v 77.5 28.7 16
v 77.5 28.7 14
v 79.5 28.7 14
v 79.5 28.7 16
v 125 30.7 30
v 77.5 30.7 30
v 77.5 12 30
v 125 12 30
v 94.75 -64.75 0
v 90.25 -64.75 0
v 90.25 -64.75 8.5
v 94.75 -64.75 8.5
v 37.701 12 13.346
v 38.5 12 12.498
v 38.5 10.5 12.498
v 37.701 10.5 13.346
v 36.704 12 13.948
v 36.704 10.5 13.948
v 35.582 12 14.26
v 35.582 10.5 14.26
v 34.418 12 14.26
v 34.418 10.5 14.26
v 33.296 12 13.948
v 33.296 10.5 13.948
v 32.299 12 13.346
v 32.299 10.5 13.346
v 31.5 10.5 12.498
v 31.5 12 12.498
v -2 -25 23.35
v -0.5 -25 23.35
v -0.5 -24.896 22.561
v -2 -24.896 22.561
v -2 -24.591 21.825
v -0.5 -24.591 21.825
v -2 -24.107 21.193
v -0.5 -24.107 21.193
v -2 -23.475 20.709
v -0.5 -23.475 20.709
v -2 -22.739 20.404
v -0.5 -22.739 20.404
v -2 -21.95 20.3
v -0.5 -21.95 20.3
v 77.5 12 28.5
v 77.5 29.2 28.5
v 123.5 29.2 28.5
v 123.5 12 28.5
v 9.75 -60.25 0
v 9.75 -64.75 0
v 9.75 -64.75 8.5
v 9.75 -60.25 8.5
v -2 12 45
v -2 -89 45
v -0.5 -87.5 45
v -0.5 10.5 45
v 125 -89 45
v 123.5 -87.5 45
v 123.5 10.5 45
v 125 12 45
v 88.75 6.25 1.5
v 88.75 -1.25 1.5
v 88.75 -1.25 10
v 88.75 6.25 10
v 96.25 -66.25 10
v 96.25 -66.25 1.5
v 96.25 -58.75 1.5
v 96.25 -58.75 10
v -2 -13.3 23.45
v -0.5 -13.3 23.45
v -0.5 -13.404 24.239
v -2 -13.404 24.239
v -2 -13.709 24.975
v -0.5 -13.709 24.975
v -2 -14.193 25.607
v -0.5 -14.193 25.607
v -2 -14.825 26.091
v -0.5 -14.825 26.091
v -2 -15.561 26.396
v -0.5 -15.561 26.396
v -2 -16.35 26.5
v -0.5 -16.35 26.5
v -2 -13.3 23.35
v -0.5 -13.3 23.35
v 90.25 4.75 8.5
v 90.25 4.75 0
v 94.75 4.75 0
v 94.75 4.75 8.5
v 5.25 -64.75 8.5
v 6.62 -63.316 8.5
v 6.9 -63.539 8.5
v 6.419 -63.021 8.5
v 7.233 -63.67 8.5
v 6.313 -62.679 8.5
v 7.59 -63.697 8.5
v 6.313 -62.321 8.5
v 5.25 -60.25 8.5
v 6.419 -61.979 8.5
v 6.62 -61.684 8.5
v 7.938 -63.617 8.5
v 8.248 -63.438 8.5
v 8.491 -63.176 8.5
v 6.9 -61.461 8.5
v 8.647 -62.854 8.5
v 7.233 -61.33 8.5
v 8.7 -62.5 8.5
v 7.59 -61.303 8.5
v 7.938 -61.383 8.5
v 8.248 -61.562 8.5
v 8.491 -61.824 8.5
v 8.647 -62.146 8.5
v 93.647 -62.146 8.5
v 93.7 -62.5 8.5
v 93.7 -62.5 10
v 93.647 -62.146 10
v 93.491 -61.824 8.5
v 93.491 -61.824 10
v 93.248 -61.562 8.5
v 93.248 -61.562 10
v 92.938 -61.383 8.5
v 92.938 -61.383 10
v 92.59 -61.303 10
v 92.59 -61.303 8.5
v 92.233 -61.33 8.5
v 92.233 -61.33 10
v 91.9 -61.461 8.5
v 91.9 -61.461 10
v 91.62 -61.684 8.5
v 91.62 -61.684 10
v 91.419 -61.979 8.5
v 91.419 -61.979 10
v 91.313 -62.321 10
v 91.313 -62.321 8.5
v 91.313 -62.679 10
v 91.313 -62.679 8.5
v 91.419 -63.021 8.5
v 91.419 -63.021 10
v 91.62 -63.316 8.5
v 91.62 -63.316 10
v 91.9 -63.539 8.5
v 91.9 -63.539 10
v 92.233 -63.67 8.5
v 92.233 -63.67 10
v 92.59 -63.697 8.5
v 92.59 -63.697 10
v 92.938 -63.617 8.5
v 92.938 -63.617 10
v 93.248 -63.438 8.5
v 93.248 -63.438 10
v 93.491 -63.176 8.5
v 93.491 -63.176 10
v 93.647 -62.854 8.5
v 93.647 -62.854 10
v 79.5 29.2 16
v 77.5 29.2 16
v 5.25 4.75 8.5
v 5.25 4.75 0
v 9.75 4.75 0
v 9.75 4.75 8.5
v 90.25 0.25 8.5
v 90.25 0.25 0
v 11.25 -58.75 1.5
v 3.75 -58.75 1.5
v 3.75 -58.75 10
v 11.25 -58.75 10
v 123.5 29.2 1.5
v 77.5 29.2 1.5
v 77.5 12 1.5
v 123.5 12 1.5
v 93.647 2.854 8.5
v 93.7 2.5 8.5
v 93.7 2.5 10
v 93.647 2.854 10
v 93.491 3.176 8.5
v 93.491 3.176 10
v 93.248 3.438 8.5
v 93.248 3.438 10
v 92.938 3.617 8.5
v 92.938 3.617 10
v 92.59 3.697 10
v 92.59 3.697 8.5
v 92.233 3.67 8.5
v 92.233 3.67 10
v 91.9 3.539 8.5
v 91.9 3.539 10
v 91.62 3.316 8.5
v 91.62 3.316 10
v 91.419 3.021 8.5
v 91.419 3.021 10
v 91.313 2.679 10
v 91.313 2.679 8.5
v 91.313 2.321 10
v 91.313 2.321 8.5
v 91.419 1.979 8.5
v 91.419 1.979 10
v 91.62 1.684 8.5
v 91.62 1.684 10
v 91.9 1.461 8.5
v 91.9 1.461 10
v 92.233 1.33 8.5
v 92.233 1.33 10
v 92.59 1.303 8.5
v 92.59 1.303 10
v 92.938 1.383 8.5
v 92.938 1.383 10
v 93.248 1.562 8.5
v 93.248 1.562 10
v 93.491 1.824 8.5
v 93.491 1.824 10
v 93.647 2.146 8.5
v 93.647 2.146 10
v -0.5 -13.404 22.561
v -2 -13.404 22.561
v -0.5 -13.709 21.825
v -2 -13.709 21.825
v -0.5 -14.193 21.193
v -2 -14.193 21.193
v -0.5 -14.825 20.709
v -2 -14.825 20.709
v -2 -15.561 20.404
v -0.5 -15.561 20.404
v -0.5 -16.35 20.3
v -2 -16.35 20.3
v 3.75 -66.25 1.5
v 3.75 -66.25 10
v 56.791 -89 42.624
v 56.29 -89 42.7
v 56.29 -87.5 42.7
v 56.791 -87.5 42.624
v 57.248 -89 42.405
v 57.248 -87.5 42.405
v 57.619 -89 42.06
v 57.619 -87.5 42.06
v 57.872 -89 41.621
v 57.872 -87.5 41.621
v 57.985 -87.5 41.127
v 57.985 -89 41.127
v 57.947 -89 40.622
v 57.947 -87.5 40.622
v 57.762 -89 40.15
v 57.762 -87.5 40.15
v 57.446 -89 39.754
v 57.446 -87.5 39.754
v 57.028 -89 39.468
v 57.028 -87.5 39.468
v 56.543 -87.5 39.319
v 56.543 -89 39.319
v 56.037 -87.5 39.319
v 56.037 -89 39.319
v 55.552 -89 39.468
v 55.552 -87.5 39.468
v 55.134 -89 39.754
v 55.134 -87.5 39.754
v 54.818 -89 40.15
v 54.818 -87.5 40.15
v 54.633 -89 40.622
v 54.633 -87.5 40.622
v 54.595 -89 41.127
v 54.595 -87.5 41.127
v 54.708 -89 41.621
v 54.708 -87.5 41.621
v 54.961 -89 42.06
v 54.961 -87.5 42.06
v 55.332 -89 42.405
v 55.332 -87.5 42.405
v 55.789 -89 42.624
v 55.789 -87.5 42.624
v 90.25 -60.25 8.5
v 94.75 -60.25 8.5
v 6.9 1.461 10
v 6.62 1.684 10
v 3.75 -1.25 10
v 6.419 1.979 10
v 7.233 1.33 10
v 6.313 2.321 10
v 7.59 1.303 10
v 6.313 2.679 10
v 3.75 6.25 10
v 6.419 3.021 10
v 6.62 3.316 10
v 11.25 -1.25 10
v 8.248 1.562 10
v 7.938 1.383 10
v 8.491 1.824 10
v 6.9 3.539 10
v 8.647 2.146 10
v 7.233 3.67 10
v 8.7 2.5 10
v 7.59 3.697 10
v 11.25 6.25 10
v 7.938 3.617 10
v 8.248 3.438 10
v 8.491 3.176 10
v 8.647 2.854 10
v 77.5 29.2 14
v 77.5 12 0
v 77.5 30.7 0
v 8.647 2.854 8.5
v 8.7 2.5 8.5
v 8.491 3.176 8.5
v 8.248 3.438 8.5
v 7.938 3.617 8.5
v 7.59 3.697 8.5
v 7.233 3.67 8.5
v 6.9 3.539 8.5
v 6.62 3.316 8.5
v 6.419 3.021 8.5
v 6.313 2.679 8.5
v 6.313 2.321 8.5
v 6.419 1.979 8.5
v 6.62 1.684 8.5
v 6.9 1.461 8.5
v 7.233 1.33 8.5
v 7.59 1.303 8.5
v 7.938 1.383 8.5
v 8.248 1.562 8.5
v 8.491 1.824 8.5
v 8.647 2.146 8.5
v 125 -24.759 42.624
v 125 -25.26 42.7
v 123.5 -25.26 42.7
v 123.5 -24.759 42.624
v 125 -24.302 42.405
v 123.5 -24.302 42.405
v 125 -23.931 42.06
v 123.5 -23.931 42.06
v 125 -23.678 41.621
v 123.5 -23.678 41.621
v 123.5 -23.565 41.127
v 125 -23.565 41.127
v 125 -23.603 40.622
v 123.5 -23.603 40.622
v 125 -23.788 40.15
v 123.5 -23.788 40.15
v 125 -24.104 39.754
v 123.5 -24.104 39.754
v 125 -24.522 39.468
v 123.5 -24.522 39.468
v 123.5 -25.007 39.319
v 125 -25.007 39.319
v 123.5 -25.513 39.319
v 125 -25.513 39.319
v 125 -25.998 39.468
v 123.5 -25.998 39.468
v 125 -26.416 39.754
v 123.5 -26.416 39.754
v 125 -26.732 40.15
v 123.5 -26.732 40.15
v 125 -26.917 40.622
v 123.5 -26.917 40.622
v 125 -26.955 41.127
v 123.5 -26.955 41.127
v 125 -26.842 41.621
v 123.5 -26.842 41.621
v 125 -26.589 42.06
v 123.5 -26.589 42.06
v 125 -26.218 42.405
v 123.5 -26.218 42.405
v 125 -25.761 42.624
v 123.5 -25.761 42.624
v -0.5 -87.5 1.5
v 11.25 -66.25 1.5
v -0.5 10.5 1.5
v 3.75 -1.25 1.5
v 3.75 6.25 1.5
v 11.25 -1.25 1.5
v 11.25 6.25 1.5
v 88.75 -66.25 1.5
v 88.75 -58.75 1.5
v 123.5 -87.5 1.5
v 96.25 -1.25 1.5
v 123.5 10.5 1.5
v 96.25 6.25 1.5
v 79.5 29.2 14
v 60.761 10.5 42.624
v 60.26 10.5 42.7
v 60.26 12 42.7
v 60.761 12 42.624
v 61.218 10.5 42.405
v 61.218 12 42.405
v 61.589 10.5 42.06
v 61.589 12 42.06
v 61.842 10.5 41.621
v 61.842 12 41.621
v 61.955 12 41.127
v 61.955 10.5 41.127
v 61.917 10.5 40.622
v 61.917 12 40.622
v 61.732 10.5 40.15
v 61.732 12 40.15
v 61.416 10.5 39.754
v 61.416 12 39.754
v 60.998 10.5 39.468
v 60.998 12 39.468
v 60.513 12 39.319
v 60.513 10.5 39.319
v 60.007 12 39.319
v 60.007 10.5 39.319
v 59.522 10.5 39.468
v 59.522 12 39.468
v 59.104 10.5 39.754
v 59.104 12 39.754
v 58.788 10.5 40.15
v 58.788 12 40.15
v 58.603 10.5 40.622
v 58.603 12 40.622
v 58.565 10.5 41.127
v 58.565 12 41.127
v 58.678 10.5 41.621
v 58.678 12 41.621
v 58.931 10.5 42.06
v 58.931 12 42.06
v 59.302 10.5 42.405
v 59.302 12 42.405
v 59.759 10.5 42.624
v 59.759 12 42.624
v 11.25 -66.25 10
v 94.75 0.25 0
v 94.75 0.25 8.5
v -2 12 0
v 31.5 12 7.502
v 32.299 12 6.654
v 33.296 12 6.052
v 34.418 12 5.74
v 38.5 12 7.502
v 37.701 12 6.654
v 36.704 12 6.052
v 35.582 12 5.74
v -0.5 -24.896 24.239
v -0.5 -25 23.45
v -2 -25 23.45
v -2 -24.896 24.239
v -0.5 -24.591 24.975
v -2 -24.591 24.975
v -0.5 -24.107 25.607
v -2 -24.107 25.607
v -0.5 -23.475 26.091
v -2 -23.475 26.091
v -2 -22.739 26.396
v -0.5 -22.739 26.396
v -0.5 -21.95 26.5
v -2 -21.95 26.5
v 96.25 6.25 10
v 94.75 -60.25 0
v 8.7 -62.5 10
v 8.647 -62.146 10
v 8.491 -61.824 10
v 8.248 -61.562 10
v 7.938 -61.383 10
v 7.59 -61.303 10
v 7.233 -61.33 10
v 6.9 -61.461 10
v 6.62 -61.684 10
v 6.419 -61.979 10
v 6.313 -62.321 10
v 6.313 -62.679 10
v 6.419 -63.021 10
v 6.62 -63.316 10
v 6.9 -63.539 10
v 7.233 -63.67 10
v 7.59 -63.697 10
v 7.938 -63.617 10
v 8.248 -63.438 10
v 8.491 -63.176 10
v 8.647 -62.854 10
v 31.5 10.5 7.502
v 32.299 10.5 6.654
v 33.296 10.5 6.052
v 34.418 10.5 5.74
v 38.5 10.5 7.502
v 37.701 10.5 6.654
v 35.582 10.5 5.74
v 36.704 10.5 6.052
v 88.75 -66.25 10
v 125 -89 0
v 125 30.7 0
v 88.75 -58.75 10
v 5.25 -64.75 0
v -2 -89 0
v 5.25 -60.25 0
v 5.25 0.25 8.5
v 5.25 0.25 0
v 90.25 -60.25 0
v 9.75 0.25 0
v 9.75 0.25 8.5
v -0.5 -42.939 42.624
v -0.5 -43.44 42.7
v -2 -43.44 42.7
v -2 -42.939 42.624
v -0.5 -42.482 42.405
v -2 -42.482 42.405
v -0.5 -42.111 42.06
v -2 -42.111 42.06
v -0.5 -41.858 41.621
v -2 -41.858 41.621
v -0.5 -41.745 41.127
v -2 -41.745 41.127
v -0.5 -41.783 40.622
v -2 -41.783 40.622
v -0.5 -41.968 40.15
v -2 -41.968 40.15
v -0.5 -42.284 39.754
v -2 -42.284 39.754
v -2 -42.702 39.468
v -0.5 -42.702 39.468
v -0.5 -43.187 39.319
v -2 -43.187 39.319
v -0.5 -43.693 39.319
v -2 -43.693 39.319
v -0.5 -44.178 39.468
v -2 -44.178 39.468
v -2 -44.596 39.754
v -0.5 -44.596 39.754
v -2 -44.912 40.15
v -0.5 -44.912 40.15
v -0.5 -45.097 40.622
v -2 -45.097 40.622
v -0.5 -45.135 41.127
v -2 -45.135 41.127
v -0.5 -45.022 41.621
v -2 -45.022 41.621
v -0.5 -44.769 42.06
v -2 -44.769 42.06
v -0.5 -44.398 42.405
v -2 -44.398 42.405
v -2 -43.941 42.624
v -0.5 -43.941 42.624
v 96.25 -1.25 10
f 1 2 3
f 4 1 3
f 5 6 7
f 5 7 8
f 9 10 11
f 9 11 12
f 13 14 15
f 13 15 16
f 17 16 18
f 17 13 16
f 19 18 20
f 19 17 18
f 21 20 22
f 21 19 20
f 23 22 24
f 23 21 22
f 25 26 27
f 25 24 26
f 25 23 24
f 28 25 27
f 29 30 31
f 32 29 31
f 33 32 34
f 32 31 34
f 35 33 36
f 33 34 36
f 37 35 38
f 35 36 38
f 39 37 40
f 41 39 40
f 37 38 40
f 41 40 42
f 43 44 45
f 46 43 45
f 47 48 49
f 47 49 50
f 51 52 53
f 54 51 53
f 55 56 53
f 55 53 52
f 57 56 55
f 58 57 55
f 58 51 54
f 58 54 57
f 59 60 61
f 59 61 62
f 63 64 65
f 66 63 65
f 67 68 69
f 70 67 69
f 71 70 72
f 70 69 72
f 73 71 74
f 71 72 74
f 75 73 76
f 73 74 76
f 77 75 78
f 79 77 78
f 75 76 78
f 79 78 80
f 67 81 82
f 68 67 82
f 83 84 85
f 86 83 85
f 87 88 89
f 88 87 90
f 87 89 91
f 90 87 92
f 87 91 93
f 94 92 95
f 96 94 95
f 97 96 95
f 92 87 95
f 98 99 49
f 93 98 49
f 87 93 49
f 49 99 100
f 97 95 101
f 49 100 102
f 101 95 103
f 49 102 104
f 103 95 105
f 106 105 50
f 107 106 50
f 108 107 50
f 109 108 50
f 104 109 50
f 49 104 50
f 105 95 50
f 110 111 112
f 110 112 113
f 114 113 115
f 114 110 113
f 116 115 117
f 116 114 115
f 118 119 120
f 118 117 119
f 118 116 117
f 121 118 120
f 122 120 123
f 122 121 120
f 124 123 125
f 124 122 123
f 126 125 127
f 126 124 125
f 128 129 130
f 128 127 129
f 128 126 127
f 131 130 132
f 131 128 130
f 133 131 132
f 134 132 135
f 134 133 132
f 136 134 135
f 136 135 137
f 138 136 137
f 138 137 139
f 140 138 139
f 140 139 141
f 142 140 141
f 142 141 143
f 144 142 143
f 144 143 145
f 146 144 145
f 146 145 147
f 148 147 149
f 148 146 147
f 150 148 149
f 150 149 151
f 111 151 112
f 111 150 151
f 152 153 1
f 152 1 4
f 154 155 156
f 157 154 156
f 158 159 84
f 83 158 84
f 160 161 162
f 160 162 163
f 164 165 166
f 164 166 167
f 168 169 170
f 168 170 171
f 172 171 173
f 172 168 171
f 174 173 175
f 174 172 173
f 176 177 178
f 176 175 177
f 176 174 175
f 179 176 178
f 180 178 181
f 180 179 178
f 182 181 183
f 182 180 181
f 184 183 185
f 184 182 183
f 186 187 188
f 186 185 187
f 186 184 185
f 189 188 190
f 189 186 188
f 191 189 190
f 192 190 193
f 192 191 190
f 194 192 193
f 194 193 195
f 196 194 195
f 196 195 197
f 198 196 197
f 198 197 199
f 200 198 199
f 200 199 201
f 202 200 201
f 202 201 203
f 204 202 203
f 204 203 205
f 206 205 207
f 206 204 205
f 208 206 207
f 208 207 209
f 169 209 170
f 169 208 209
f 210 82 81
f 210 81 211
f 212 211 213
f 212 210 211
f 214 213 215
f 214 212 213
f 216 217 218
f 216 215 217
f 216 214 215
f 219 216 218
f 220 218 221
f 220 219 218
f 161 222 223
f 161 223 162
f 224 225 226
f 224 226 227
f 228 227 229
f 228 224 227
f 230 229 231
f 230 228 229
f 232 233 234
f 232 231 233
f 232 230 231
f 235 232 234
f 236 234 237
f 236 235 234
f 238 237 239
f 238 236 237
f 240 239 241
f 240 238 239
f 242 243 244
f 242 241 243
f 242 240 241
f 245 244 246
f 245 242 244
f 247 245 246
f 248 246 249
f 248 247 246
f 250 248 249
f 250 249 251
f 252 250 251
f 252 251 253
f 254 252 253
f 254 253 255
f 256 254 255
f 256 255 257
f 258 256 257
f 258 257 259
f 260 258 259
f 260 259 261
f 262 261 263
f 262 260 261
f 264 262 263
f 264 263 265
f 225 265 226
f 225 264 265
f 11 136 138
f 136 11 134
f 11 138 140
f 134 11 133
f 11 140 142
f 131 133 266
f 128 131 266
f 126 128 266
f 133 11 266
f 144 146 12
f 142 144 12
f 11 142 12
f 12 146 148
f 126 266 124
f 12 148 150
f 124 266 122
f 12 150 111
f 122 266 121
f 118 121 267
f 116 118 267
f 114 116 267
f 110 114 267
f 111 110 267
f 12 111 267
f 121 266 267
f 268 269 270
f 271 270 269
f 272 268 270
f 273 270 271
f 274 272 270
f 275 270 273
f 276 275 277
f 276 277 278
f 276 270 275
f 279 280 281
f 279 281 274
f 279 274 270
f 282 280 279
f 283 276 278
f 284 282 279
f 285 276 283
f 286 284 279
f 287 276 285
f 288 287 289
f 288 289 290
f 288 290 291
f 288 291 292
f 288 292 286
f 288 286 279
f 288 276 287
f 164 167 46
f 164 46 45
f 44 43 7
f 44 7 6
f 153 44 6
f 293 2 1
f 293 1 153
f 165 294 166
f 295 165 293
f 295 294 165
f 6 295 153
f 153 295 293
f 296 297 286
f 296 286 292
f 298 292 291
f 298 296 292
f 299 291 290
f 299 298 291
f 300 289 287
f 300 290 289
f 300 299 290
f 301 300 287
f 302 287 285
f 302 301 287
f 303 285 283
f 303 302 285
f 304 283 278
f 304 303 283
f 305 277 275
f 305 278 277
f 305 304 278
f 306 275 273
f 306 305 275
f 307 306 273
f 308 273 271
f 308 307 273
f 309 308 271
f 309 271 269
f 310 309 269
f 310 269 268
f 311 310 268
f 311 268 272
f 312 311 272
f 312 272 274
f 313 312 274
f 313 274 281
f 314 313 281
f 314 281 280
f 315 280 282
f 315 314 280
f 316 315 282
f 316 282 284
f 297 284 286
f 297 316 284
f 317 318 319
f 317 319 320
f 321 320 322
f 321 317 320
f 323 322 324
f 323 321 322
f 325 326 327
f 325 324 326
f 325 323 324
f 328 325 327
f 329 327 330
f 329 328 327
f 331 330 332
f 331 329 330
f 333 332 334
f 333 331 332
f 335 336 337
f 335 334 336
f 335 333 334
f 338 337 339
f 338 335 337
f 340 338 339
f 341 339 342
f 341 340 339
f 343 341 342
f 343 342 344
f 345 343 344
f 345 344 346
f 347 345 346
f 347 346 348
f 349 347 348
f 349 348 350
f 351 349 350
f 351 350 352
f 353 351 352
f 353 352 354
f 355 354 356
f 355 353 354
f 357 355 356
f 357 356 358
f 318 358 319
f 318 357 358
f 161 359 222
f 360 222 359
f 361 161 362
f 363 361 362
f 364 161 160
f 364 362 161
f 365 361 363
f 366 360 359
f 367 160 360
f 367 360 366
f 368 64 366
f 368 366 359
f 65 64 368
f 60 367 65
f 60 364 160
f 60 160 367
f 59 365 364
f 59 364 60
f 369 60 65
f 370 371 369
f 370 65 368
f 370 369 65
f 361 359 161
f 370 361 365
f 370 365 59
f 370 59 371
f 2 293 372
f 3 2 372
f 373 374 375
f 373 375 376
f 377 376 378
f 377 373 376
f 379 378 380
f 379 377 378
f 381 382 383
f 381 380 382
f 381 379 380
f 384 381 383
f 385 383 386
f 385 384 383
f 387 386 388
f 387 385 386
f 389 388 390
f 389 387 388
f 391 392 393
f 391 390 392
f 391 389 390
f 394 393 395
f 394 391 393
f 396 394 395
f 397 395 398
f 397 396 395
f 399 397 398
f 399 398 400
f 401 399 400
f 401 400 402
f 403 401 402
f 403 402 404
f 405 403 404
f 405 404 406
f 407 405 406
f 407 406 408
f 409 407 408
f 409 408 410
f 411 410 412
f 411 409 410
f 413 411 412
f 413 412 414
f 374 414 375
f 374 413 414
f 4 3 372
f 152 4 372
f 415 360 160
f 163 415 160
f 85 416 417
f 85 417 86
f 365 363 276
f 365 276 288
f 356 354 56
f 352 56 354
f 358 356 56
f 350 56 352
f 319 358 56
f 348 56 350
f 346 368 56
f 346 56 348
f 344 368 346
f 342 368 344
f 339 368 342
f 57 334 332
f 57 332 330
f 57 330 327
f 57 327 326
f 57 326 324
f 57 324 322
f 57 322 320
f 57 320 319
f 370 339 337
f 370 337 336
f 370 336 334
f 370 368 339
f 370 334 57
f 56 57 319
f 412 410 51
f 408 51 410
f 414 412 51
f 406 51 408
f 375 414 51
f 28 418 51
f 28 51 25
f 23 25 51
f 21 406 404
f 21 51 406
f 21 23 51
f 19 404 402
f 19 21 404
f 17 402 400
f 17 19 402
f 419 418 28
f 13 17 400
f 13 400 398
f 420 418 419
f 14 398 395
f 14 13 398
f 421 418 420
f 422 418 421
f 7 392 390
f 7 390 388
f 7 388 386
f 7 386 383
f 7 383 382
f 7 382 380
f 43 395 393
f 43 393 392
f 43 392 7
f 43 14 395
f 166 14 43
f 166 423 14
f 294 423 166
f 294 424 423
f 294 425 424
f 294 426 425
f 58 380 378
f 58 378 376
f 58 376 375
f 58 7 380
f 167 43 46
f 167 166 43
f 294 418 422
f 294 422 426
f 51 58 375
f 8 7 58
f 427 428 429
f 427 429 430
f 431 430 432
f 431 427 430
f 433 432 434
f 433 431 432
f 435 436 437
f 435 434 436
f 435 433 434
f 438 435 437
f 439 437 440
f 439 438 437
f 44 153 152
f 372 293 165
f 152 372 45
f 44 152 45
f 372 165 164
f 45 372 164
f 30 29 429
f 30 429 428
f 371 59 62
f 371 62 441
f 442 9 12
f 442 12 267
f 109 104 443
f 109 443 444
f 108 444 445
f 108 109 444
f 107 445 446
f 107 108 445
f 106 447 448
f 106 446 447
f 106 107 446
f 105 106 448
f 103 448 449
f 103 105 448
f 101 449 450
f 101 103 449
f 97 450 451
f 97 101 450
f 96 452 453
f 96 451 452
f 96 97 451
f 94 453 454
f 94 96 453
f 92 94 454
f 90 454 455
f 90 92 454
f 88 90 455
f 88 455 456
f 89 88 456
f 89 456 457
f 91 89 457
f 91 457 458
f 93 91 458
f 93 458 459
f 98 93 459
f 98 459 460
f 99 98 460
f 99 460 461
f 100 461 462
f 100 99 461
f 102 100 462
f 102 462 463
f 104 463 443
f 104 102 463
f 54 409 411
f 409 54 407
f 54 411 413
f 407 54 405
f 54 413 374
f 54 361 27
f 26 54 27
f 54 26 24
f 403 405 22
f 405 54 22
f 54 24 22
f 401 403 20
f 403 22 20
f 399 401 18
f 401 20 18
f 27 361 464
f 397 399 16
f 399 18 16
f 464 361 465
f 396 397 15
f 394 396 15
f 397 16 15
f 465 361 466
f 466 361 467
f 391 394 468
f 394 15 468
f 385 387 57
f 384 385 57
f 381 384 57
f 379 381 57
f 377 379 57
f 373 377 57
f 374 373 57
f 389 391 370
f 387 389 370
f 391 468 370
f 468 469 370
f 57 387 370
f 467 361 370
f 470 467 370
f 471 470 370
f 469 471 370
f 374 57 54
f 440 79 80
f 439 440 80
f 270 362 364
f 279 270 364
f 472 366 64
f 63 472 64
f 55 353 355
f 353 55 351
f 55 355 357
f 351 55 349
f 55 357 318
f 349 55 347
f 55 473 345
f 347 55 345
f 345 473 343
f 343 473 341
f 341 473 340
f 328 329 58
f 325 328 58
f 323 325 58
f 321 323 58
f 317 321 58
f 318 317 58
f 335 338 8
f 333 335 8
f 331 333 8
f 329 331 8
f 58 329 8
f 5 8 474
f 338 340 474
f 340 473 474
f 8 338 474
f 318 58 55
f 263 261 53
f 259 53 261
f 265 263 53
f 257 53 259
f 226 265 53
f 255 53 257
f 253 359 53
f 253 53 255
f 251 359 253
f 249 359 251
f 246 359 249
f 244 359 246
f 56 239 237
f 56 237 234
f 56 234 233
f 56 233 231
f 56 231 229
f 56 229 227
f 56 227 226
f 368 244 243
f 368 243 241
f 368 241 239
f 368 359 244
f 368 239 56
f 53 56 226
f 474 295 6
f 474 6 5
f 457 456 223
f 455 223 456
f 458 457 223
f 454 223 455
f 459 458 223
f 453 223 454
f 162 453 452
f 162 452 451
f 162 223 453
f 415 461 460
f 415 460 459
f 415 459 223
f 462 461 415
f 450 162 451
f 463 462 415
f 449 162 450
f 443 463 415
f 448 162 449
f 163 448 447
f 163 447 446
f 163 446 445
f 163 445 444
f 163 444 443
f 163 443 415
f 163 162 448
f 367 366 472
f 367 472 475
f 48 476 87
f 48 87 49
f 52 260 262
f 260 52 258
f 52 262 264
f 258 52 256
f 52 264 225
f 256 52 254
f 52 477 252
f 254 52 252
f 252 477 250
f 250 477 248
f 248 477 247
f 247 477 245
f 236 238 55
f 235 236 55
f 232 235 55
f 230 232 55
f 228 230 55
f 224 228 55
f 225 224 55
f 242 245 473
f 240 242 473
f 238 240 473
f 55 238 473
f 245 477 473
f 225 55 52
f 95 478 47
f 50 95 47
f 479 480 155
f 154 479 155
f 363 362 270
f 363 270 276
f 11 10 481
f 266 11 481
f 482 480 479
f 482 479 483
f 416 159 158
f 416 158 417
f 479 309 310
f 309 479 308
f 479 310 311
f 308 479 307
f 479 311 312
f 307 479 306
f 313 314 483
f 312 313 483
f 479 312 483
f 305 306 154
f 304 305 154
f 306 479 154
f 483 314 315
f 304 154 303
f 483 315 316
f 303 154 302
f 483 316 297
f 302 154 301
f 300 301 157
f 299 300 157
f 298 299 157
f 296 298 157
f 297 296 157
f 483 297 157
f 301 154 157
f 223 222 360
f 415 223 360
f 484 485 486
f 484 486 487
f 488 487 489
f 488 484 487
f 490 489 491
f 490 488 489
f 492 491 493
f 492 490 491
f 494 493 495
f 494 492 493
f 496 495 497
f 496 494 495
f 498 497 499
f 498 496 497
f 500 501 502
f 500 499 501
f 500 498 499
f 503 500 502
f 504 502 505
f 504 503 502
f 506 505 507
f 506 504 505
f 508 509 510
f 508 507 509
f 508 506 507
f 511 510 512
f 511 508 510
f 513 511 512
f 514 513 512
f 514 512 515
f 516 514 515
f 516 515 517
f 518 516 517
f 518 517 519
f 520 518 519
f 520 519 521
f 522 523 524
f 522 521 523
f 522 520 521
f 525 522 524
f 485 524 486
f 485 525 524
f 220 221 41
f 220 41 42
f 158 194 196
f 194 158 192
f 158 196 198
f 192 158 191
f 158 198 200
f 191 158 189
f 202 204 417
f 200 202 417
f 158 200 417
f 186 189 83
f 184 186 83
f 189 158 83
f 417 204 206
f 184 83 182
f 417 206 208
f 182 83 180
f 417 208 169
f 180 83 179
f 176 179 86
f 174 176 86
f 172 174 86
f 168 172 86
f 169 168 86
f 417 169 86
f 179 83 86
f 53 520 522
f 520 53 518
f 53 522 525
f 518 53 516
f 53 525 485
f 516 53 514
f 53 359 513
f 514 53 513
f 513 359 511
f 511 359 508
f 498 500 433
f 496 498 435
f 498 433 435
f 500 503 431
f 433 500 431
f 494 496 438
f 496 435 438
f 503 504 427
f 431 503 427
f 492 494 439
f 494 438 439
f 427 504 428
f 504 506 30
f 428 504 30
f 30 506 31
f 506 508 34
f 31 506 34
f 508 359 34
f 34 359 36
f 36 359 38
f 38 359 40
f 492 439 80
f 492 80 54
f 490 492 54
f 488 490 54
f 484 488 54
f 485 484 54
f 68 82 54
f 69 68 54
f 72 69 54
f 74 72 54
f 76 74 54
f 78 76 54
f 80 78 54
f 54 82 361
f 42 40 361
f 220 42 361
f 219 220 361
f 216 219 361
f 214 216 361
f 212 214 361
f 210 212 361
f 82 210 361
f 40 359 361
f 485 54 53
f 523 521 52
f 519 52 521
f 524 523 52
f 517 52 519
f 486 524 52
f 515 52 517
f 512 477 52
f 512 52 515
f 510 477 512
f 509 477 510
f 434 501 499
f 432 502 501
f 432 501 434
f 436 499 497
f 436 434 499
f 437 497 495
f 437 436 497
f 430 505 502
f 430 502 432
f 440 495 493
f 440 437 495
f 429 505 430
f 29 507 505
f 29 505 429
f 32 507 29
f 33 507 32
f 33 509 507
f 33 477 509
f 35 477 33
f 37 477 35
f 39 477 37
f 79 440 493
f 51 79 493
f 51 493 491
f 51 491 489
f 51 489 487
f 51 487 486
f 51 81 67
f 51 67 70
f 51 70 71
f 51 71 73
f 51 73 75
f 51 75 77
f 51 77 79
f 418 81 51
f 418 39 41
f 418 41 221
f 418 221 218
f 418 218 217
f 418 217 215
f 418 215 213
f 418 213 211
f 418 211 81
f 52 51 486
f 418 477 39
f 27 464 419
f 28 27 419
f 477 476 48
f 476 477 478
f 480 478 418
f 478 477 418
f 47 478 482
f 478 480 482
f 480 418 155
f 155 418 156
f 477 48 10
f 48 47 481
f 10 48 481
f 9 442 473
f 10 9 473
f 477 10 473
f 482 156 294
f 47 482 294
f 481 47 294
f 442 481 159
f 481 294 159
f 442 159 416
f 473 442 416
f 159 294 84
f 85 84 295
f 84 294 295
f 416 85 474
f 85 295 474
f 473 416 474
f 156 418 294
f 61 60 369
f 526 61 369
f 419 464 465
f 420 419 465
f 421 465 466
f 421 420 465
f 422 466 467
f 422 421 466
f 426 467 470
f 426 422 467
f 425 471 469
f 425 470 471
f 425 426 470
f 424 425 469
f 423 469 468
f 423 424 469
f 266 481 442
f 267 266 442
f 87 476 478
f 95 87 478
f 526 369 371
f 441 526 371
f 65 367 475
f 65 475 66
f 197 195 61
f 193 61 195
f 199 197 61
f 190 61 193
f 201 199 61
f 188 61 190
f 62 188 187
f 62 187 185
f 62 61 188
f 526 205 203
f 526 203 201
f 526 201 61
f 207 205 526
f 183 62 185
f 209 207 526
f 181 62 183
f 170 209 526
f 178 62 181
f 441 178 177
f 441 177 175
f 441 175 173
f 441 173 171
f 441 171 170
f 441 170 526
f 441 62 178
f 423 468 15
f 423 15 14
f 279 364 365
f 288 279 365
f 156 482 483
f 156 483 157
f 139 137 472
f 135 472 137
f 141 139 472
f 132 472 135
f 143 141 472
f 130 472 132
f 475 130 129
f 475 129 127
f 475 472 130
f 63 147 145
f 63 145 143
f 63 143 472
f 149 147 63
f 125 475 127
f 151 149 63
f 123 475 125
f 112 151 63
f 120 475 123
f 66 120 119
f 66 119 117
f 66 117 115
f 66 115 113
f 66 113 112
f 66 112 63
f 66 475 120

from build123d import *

# Parameters (mm, degrees)
BOX054_W          = 2
BOX054_H          = 2
BOX054_DEPTH      = 2
BOX051_W          = 47.5
BOX051_H          = 17.2
BOX051_DEPTH      = 27
BOX050_W          = 47.5
BOX050_H          = 18.7
BOX050_DEPTH      = 30
BOX053_W          = 10
BOX053_H          = 11.7
BOX053_DEPTH      = 6.2
FILLET001_R       = 3.05
CYLINDER038_R     = 1.7
CYLINDER038_DEPTH = 10
CYLINDER037_R     = 1.7
CYLINDER037_DEPTH = 10
CYLINDER036_R     = 1.7
CYLINDER036_DEPTH = 10
CYLINDER035_R     = 1.7
CYLINDER035_DEPTH = 10
BOX024_W          = 10
BOX024_H          = 10
BOX024_DEPTH      = 10
BOX025_W          = 10
BOX025_H          = 10
BOX025_DEPTH      = 10
CYLINDER023_R     = 4.3
CYLINDER023_DEPTH = 5
CYLINDER019_R     = 1.2
CYLINDER019_DEPTH = 10
BOX013_W          = 4.5
BOX013_H          = 4.5
BOX013_DEPTH      = 10
BOX012_W          = 7.5
BOX012_H          = 7.5
BOX012_DEPTH      = 10
CYLINDER020_R     = 1.2
CYLINDER020_DEPTH = 10
BOX015_W          = 4.5
BOX015_H          = 4.5
BOX015_DEPTH      = 10
BOX014_W          = 7.5
BOX014_H          = 7.5
BOX014_DEPTH      = 10
CYLINDER021_R     = 1.2
CYLINDER021_DEPTH = 10
BOX017_W          = 4.5
BOX017_H          = 4.5
BOX017_DEPTH      = 10
BOX016_W          = 7.5
BOX016_H          = 7.5
BOX016_DEPTH      = 10
CYLINDER022_R     = 1.2
CYLINDER022_DEPTH = 10
BOX019_W          = 4.5
BOX019_H          = 4.5
BOX019_DEPTH      = 10
BOX018_W          = 7.5
BOX018_H          = 7.5
BOX018_DEPTH      = 10
BOX022_W          = 4.5
BOX022_H          = 4.5
BOX022_DEPTH      = 10
BOX021_W          = 4.5
BOX021_H          = 4.5
BOX021_DEPTH      = 10
BOX023_W          = 4.5
BOX023_H          = 4.5
BOX023_DEPTH      = 10
CYLINDER016_R     = 1.2
CYLINDER016_DEPTH = 100
BOX020_W          = 4.5
BOX020_H          = 4.5
BOX020_DEPTH      = 10
CYLINDER015_R     = 1.2
CYLINDER015_DEPTH = 100
BOX010_W          = 124
BOX010_H          = 98
BOX010_DEPTH      = 45
BOX009_W          = 127
BOX009_H          = 101
BOX009_DEPTH      = 45


with BuildPart() as cube054:
    # Box054 → Box054 (new body)
    with BuildSketch(Plane(origin=(77.5, 107.7, 14), x_dir=(1, 0, 0), z_dir=(0, 0, 1))):
        with Locations((1, 1)):
            Rectangle(BOX054_W, BOX054_H)
    extrude(amount=BOX054_DEPTH)


with BuildPart() as cube051:
    # Box051 → Box051 (new body)
    with BuildSketch(Plane(origin=(-1.5, 0, 60), x_dir=(1, 0, 0), z_dir=(0, 0, 1))):
        with Locations((23.75, 8.6)):
            Rectangle(BOX051_W, BOX051_H)
    extrude(amount=BOX051_DEPTH)


with BuildPart() as batteryholder:
    # Box050 → Box050 (new body)
    with BuildSketch(Plane.XY.offset(58.5)):
        with Locations((23.75, 9.35)):
            Rectangle(BOX050_W, BOX050_H)
    extrude(amount=BOX050_DEPTH)

    # Cut062: cut Cube051
    add(cube051.part, mode=Mode.SUBTRACT)


with BuildPart() as batteryholder_1:
    # Cut062 placement: moved
    add(batteryholder.part.moved(Location((77.5, 91, -58.5))))

    # Fusion004: union Cube054
    add(cube054.part)


with BuildPart() as fillet001:
    # Box053 → Box053 (new body)
    with BuildSketch(Plane(origin=(0, -50, 10.3), x_dir=(1, 0, 0), z_dir=(0, 0, 1))):
        with Locations((5, 5.85)):
            Rectangle(BOX053_W, BOX053_H)
    extrude(amount=BOX053_DEPTH)

    # Fillet001
    fillet001_edges = [fillet001.edges().sort_by_distance(p)[0] for p in [
        (5, -50, 10.3),
        (5, -50, 16.5),
        (5, -38.3, 10.3),
        (5, -38.3, 16.5),
    ]]
    fillet(fillet001_edges, radius=FILLET001_R)


with BuildPart() as fillet001_1:
    # Fillet001 placement: moved
    add(fillet001.part.moved(Location((-5, 104, 10))))


with BuildPart() as cylinder038:
    # Cylinder038 → Cylinder038 (new body)
    with BuildSketch(Plane(origin=(126.15, 53.74, 41), x_dir=(0, 0, 1), z_dir=(-1, 0, 0))):
        Circle(CYLINDER038_R)
    extrude(amount=CYLINDER038_DEPTH)


with BuildPart() as cylinder037:
    # Cylinder037 → Cylinder037 (new body)
    with BuildSketch(Plane(origin=(56.29, -11.48, 41), x_dir=(0, 0, 1), z_dir=(0, 1, 0))):
        Circle(CYLINDER037_R)
    extrude(amount=CYLINDER037_DEPTH)


with BuildPart() as cylinder036:
    # Cylinder036 → Cylinder036 (new body)
    with BuildSketch(Plane(origin=(60.26, 82.82, 41), x_dir=(0, 0, 1), z_dir=(0, 1, 0))):
        Circle(CYLINDER036_R)
    extrude(amount=CYLINDER036_DEPTH)


with BuildPart() as cylinder035:
    # Cylinder035 → Cylinder035 (new body)
    with BuildSketch(Plane(origin=(6.21, 35.56, 41), x_dir=(0, 0, 1), z_dir=(-1, 0, 0))):
        Circle(CYLINDER035_R)
    extrude(amount=CYLINDER035_DEPTH)


with BuildPart() as cube024:
    # Box024 → Box024 (new body)
    with BuildSketch(Plane(origin=(53.5, -105, 4), x_dir=(1, 0, 0), z_dir=(0, 0, 1))):
        with Locations((5, 5)):
            Rectangle(BOX024_W, BOX024_H)
    extrude(amount=BOX024_DEPTH)


with BuildPart() as cube025:
    # Box025 → Box025 (new body)
    with BuildSketch(Plane(origin=(36.5, -105, 4), x_dir=(1, 0, 0), z_dir=(0, 0, 1))):
        with Locations((5, 5)):
            Rectangle(BOX025_W, BOX025_H)
    extrude(amount=BOX025_DEPTH)


with BuildPart() as cut034:
    # Cylinder023 → Cylinder023 (new body)
    with BuildSketch(Plane(origin=(50, -100, 9), x_dir=(1, 0, 0), z_dir=(0, -1, 0))):
        Circle(CYLINDER023_R)
    extrude(amount=CYLINDER023_DEPTH)

    # Cut033: cut Cube025
    add(cube025.part, mode=Mode.SUBTRACT)

    # Cut034: cut Cube024
    add(cube024.part, mode=Mode.SUBTRACT)


with BuildPart() as cut034_1:
    # Cut034 placement: moved
    add(cut034.part.moved(Location((-15, 193, 1))))


with BuildPart() as cylinder019:
    # Cylinder019 → Cylinder019 (new body)
    with BuildSketch(Plane(origin=(7.5, 16.5, 105), x_dir=(1, 0, 0), z_dir=(0, 0, 1))):
        Circle(CYLINDER019_R)
    extrude(amount=CYLINDER019_DEPTH)


with BuildPart() as cube013:
    # Box013 → Box013 (new body)
    with BuildSketch(Plane(origin=(5.25, 14.25, 98.5), x_dir=(1, 0, 0), z_dir=(0, 0, 1))):
        with Locations((2.25, 2.25)):
            Rectangle(BOX013_W, BOX013_H)
    extrude(amount=BOX013_DEPTH)


with BuildPart() as cut008:
    # Box012 → Box012 (new body)
    with BuildSketch(Plane(origin=(3.75, 12.75, 100), x_dir=(1, 0, 0), z_dir=(0, 0, 1))):
        with Locations((3.75, 3.75)):
            Rectangle(BOX012_W, BOX012_H)
    extrude(amount=BOX012_DEPTH)

    # Cut007: cut Cube013
    add(cube013.part, mode=Mode.SUBTRACT)

    # Cut008: cut Cylinder019
    add(cylinder019.part, mode=Mode.SUBTRACT)


with BuildPart() as cut008_1:
    # Cut008 placement: moved
    add(cut008.part.moved(Location((0, 0, -100))))


with BuildPart() as cylinder020:
    # Cylinder020 → Cylinder020 (new body)
    with BuildSketch(Plane(origin=(7.5, 16.5, 105), x_dir=(1, 0, 0), z_dir=(0, 0, 1))):
        Circle(CYLINDER020_R)
    extrude(amount=CYLINDER020_DEPTH)


with BuildPart() as cube015:
    # Box015 → Box015 (new body)
    with BuildSketch(Plane(origin=(5.25, 14.25, 98.5), x_dir=(1, 0, 0), z_dir=(0, 0, 1))):
        with Locations((2.25, 2.25)):
            Rectangle(BOX015_W, BOX015_H)
    extrude(amount=BOX015_DEPTH)


with BuildPart() as cut010:
    # Box014 → Box014 (new body)
    with BuildSketch(Plane(origin=(3.75, 12.75, 100), x_dir=(1, 0, 0), z_dir=(0, 0, 1))):
        with Locations((3.75, 3.75)):
            Rectangle(BOX014_W, BOX014_H)
    extrude(amount=BOX014_DEPTH)

    # Cut011: cut Cube015
    add(cube015.part, mode=Mode.SUBTRACT)

    # Cut010: cut Cylinder020
    add(cylinder020.part, mode=Mode.SUBTRACT)


with BuildPart() as cut010_1:
    # Cut010 placement: moved
    add(cut010.part.moved(Location((85, 0, -100))))


with BuildPart() as cylinder021:
    # Cylinder021 → Cylinder021 (new body)
    with BuildSketch(Plane(origin=(7.5, 16.5, 105), x_dir=(1, 0, 0), z_dir=(0, 0, 1))):
        Circle(CYLINDER021_R)
    extrude(amount=CYLINDER021_DEPTH)


with BuildPart() as cube017:
    # Box017 → Box017 (new body)
    with BuildSketch(Plane(origin=(5.25, 14.25, 98.5), x_dir=(1, 0, 0), z_dir=(0, 0, 1))):
        with Locations((2.25, 2.25)):
            Rectangle(BOX017_W, BOX017_H)
    extrude(amount=BOX017_DEPTH)


with BuildPart() as cut013:
    # Box016 → Box016 (new body)
    with BuildSketch(Plane(origin=(3.75, 12.75, 100), x_dir=(1, 0, 0), z_dir=(0, 0, 1))):
        with Locations((3.75, 3.75)):
            Rectangle(BOX016_W, BOX016_H)
    extrude(amount=BOX016_DEPTH)

    # Cut012: cut Cube017
    add(cube017.part, mode=Mode.SUBTRACT)

    # Cut013: cut Cylinder021
    add(cylinder021.part, mode=Mode.SUBTRACT)


with BuildPart() as cut013_1:
    # Cut013 placement: moved
    add(cut013.part.moved(Location((85, 65, -100))))


with BuildPart() as cylinder022:
    # Cylinder022 → Cylinder022 (new body)
    with BuildSketch(Plane(origin=(7.5, 16.5, 105), x_dir=(1, 0, 0), z_dir=(0, 0, 1))):
        Circle(CYLINDER022_R)
    extrude(amount=CYLINDER022_DEPTH)


with BuildPart() as cube019:
    # Box019 → Box019 (new body)
    with BuildSketch(Plane(origin=(5.25, 14.25, 98.5), x_dir=(1, 0, 0), z_dir=(0, 0, 1))):
        with Locations((2.25, 2.25)):
            Rectangle(BOX019_W, BOX019_H)
    extrude(amount=BOX019_DEPTH)


with BuildPart() as cut014:
    # Box018 → Box018 (new body)
    with BuildSketch(Plane(origin=(3.75, 12.75, 100), x_dir=(1, 0, 0), z_dir=(0, 0, 1))):
        with Locations((3.75, 3.75)):
            Rectangle(BOX018_W, BOX018_H)
    extrude(amount=BOX018_DEPTH)

    # Cut015: cut Cube019
    add(cube019.part, mode=Mode.SUBTRACT)

    # Cut014: cut Cylinder022
    add(cylinder022.part, mode=Mode.SUBTRACT)


with BuildPart() as cut014_1:
    # Cut014 placement: moved
    add(cut014.part.moved(Location((0, 65, -100))))


with BuildPart() as cube022:
    # Box022 → Box022 (new body)
    with BuildSketch(Plane(origin=(90.25, 79.25, -2), x_dir=(1, 0, 0), z_dir=(0, 0, 1))):
        with Locations((2.25, 2.25)):
            Rectangle(BOX022_W, BOX022_H)
    extrude(amount=BOX022_DEPTH)


with BuildPart() as cube021:
    # Box021 → Box021 (new body)
    with BuildSketch(Plane(origin=(5.25, 79.25, -2), x_dir=(1, 0, 0), z_dir=(0, 0, 1))):
        with Locations((2.25, 2.25)):
            Rectangle(BOX021_W, BOX021_H)
    extrude(amount=BOX021_DEPTH)


with BuildPart() as cube023:
    # Box023 → Box023 (new body)
    with BuildSketch(Plane(origin=(90.25, 14.25, -2), x_dir=(1, 0, 0), z_dir=(0, 0, 1))):
        with Locations((2.25, 2.25)):
            Rectangle(BOX023_W, BOX023_H)
    extrude(amount=BOX023_DEPTH)


with BuildPart() as cylinder016:
    # Cylinder016 → Cylinder016 (new body)
    with BuildSketch(Plane(origin=(92.5, 16.5, -25), x_dir=(1, 0, 0), z_dir=(0, 0, 1))):
        Circle(CYLINDER016_R)
    extrude(amount=CYLINDER016_DEPTH)


with BuildPart() as cube020:
    # Box020 → Box020 (new body)
    with BuildSketch(Plane(origin=(5.25, 14.25, -2), x_dir=(1, 0, 0), z_dir=(0, 0, 1))):
        with Locations((2.25, 2.25)):
            Rectangle(BOX020_W, BOX020_H)
    extrude(amount=BOX020_DEPTH)


with BuildPart() as cylinder015:
    # Cylinder015 → Cylinder015 (new body)
    with BuildSketch(Plane(origin=(7.5, 16.5, -25), x_dir=(1, 0, 0), z_dir=(0, 0, 1))):
        Circle(CYLINDER015_R)
    extrude(amount=CYLINDER015_DEPTH)


with BuildPart() as cube010:
    # Box010 → Box010 (new body)
    with BuildSketch(Plane(origin=(-0.5, -8.5, 1.5), x_dir=(1, 0, 0), z_dir=(0, 0, 1))):
        with Locations((62, 49)):
            Rectangle(BOX010_W, BOX010_H)
    extrude(amount=BOX010_DEPTH)


with BuildPart() as controlbox:
    # Box009 → Box009 (new body)
    with BuildSketch(Plane(origin=(-2, -10, 0), x_dir=(1, 0, 0), z_dir=(0, 0, 1))):
        with Locations((63.5, 50.5)):
            Rectangle(BOX009_W, BOX009_H)
    extrude(amount=BOX009_DEPTH)

    # Cut006: cut Cube010
    add(cube010.part, mode=Mode.SUBTRACT)

    # Cut009: cut Cylinder015
    add(cylinder015.part, mode=Mode.SUBTRACT)

    # Cut016: cut Cube020
    add(cube020.part, mode=Mode.SUBTRACT)

    # Cut017: cut Cylinder016
    add(cylinder016.part, mode=Mode.SUBTRACT)

    # Cut018: cut Cube023
    add(cube023.part, mode=Mode.SUBTRACT)

    # Cut019: cut Cube021
    add(cube021.part, mode=Mode.SUBTRACT)

    # Cut020: cut Cube022
    add(cube022.part, mode=Mode.SUBTRACT)

    # Connect: union Cut014
    add(cut014_1.part)

    # Connect001: union Cut013
    add(cut013_1.part)

    # Connect002: union Cut010
    add(cut010_1.part)

    # Connect003: union Cut008
    add(cut008_1.part)

    # Cut043: cut Cut034
    add(cut034_1.part, mode=Mode.SUBTRACT)

    # Cut058: cut Cylinder035
    add(cylinder035.part, mode=Mode.SUBTRACT)

    # Cut059: cut Cylinder036
    add(cylinder036.part, mode=Mode.SUBTRACT)

    # Cut060: cut Cylinder037
    add(cylinder037.part, mode=Mode.SUBTRACT)

    # Cut061: cut Cylinder038
    add(cylinder038.part, mode=Mode.SUBTRACT)

    # Cut064: cut Fillet001
    add(fillet001_1.part, mode=Mode.SUBTRACT)

    # Fusion006: union BatteryHolder
    add(batteryholder_1.part)


with BuildPart() as controlbox_1:
    # Fusion006 placement: moved
    add(controlbox.part.moved(Location((0, -79, 0))))


solid = controlbox_1.part
